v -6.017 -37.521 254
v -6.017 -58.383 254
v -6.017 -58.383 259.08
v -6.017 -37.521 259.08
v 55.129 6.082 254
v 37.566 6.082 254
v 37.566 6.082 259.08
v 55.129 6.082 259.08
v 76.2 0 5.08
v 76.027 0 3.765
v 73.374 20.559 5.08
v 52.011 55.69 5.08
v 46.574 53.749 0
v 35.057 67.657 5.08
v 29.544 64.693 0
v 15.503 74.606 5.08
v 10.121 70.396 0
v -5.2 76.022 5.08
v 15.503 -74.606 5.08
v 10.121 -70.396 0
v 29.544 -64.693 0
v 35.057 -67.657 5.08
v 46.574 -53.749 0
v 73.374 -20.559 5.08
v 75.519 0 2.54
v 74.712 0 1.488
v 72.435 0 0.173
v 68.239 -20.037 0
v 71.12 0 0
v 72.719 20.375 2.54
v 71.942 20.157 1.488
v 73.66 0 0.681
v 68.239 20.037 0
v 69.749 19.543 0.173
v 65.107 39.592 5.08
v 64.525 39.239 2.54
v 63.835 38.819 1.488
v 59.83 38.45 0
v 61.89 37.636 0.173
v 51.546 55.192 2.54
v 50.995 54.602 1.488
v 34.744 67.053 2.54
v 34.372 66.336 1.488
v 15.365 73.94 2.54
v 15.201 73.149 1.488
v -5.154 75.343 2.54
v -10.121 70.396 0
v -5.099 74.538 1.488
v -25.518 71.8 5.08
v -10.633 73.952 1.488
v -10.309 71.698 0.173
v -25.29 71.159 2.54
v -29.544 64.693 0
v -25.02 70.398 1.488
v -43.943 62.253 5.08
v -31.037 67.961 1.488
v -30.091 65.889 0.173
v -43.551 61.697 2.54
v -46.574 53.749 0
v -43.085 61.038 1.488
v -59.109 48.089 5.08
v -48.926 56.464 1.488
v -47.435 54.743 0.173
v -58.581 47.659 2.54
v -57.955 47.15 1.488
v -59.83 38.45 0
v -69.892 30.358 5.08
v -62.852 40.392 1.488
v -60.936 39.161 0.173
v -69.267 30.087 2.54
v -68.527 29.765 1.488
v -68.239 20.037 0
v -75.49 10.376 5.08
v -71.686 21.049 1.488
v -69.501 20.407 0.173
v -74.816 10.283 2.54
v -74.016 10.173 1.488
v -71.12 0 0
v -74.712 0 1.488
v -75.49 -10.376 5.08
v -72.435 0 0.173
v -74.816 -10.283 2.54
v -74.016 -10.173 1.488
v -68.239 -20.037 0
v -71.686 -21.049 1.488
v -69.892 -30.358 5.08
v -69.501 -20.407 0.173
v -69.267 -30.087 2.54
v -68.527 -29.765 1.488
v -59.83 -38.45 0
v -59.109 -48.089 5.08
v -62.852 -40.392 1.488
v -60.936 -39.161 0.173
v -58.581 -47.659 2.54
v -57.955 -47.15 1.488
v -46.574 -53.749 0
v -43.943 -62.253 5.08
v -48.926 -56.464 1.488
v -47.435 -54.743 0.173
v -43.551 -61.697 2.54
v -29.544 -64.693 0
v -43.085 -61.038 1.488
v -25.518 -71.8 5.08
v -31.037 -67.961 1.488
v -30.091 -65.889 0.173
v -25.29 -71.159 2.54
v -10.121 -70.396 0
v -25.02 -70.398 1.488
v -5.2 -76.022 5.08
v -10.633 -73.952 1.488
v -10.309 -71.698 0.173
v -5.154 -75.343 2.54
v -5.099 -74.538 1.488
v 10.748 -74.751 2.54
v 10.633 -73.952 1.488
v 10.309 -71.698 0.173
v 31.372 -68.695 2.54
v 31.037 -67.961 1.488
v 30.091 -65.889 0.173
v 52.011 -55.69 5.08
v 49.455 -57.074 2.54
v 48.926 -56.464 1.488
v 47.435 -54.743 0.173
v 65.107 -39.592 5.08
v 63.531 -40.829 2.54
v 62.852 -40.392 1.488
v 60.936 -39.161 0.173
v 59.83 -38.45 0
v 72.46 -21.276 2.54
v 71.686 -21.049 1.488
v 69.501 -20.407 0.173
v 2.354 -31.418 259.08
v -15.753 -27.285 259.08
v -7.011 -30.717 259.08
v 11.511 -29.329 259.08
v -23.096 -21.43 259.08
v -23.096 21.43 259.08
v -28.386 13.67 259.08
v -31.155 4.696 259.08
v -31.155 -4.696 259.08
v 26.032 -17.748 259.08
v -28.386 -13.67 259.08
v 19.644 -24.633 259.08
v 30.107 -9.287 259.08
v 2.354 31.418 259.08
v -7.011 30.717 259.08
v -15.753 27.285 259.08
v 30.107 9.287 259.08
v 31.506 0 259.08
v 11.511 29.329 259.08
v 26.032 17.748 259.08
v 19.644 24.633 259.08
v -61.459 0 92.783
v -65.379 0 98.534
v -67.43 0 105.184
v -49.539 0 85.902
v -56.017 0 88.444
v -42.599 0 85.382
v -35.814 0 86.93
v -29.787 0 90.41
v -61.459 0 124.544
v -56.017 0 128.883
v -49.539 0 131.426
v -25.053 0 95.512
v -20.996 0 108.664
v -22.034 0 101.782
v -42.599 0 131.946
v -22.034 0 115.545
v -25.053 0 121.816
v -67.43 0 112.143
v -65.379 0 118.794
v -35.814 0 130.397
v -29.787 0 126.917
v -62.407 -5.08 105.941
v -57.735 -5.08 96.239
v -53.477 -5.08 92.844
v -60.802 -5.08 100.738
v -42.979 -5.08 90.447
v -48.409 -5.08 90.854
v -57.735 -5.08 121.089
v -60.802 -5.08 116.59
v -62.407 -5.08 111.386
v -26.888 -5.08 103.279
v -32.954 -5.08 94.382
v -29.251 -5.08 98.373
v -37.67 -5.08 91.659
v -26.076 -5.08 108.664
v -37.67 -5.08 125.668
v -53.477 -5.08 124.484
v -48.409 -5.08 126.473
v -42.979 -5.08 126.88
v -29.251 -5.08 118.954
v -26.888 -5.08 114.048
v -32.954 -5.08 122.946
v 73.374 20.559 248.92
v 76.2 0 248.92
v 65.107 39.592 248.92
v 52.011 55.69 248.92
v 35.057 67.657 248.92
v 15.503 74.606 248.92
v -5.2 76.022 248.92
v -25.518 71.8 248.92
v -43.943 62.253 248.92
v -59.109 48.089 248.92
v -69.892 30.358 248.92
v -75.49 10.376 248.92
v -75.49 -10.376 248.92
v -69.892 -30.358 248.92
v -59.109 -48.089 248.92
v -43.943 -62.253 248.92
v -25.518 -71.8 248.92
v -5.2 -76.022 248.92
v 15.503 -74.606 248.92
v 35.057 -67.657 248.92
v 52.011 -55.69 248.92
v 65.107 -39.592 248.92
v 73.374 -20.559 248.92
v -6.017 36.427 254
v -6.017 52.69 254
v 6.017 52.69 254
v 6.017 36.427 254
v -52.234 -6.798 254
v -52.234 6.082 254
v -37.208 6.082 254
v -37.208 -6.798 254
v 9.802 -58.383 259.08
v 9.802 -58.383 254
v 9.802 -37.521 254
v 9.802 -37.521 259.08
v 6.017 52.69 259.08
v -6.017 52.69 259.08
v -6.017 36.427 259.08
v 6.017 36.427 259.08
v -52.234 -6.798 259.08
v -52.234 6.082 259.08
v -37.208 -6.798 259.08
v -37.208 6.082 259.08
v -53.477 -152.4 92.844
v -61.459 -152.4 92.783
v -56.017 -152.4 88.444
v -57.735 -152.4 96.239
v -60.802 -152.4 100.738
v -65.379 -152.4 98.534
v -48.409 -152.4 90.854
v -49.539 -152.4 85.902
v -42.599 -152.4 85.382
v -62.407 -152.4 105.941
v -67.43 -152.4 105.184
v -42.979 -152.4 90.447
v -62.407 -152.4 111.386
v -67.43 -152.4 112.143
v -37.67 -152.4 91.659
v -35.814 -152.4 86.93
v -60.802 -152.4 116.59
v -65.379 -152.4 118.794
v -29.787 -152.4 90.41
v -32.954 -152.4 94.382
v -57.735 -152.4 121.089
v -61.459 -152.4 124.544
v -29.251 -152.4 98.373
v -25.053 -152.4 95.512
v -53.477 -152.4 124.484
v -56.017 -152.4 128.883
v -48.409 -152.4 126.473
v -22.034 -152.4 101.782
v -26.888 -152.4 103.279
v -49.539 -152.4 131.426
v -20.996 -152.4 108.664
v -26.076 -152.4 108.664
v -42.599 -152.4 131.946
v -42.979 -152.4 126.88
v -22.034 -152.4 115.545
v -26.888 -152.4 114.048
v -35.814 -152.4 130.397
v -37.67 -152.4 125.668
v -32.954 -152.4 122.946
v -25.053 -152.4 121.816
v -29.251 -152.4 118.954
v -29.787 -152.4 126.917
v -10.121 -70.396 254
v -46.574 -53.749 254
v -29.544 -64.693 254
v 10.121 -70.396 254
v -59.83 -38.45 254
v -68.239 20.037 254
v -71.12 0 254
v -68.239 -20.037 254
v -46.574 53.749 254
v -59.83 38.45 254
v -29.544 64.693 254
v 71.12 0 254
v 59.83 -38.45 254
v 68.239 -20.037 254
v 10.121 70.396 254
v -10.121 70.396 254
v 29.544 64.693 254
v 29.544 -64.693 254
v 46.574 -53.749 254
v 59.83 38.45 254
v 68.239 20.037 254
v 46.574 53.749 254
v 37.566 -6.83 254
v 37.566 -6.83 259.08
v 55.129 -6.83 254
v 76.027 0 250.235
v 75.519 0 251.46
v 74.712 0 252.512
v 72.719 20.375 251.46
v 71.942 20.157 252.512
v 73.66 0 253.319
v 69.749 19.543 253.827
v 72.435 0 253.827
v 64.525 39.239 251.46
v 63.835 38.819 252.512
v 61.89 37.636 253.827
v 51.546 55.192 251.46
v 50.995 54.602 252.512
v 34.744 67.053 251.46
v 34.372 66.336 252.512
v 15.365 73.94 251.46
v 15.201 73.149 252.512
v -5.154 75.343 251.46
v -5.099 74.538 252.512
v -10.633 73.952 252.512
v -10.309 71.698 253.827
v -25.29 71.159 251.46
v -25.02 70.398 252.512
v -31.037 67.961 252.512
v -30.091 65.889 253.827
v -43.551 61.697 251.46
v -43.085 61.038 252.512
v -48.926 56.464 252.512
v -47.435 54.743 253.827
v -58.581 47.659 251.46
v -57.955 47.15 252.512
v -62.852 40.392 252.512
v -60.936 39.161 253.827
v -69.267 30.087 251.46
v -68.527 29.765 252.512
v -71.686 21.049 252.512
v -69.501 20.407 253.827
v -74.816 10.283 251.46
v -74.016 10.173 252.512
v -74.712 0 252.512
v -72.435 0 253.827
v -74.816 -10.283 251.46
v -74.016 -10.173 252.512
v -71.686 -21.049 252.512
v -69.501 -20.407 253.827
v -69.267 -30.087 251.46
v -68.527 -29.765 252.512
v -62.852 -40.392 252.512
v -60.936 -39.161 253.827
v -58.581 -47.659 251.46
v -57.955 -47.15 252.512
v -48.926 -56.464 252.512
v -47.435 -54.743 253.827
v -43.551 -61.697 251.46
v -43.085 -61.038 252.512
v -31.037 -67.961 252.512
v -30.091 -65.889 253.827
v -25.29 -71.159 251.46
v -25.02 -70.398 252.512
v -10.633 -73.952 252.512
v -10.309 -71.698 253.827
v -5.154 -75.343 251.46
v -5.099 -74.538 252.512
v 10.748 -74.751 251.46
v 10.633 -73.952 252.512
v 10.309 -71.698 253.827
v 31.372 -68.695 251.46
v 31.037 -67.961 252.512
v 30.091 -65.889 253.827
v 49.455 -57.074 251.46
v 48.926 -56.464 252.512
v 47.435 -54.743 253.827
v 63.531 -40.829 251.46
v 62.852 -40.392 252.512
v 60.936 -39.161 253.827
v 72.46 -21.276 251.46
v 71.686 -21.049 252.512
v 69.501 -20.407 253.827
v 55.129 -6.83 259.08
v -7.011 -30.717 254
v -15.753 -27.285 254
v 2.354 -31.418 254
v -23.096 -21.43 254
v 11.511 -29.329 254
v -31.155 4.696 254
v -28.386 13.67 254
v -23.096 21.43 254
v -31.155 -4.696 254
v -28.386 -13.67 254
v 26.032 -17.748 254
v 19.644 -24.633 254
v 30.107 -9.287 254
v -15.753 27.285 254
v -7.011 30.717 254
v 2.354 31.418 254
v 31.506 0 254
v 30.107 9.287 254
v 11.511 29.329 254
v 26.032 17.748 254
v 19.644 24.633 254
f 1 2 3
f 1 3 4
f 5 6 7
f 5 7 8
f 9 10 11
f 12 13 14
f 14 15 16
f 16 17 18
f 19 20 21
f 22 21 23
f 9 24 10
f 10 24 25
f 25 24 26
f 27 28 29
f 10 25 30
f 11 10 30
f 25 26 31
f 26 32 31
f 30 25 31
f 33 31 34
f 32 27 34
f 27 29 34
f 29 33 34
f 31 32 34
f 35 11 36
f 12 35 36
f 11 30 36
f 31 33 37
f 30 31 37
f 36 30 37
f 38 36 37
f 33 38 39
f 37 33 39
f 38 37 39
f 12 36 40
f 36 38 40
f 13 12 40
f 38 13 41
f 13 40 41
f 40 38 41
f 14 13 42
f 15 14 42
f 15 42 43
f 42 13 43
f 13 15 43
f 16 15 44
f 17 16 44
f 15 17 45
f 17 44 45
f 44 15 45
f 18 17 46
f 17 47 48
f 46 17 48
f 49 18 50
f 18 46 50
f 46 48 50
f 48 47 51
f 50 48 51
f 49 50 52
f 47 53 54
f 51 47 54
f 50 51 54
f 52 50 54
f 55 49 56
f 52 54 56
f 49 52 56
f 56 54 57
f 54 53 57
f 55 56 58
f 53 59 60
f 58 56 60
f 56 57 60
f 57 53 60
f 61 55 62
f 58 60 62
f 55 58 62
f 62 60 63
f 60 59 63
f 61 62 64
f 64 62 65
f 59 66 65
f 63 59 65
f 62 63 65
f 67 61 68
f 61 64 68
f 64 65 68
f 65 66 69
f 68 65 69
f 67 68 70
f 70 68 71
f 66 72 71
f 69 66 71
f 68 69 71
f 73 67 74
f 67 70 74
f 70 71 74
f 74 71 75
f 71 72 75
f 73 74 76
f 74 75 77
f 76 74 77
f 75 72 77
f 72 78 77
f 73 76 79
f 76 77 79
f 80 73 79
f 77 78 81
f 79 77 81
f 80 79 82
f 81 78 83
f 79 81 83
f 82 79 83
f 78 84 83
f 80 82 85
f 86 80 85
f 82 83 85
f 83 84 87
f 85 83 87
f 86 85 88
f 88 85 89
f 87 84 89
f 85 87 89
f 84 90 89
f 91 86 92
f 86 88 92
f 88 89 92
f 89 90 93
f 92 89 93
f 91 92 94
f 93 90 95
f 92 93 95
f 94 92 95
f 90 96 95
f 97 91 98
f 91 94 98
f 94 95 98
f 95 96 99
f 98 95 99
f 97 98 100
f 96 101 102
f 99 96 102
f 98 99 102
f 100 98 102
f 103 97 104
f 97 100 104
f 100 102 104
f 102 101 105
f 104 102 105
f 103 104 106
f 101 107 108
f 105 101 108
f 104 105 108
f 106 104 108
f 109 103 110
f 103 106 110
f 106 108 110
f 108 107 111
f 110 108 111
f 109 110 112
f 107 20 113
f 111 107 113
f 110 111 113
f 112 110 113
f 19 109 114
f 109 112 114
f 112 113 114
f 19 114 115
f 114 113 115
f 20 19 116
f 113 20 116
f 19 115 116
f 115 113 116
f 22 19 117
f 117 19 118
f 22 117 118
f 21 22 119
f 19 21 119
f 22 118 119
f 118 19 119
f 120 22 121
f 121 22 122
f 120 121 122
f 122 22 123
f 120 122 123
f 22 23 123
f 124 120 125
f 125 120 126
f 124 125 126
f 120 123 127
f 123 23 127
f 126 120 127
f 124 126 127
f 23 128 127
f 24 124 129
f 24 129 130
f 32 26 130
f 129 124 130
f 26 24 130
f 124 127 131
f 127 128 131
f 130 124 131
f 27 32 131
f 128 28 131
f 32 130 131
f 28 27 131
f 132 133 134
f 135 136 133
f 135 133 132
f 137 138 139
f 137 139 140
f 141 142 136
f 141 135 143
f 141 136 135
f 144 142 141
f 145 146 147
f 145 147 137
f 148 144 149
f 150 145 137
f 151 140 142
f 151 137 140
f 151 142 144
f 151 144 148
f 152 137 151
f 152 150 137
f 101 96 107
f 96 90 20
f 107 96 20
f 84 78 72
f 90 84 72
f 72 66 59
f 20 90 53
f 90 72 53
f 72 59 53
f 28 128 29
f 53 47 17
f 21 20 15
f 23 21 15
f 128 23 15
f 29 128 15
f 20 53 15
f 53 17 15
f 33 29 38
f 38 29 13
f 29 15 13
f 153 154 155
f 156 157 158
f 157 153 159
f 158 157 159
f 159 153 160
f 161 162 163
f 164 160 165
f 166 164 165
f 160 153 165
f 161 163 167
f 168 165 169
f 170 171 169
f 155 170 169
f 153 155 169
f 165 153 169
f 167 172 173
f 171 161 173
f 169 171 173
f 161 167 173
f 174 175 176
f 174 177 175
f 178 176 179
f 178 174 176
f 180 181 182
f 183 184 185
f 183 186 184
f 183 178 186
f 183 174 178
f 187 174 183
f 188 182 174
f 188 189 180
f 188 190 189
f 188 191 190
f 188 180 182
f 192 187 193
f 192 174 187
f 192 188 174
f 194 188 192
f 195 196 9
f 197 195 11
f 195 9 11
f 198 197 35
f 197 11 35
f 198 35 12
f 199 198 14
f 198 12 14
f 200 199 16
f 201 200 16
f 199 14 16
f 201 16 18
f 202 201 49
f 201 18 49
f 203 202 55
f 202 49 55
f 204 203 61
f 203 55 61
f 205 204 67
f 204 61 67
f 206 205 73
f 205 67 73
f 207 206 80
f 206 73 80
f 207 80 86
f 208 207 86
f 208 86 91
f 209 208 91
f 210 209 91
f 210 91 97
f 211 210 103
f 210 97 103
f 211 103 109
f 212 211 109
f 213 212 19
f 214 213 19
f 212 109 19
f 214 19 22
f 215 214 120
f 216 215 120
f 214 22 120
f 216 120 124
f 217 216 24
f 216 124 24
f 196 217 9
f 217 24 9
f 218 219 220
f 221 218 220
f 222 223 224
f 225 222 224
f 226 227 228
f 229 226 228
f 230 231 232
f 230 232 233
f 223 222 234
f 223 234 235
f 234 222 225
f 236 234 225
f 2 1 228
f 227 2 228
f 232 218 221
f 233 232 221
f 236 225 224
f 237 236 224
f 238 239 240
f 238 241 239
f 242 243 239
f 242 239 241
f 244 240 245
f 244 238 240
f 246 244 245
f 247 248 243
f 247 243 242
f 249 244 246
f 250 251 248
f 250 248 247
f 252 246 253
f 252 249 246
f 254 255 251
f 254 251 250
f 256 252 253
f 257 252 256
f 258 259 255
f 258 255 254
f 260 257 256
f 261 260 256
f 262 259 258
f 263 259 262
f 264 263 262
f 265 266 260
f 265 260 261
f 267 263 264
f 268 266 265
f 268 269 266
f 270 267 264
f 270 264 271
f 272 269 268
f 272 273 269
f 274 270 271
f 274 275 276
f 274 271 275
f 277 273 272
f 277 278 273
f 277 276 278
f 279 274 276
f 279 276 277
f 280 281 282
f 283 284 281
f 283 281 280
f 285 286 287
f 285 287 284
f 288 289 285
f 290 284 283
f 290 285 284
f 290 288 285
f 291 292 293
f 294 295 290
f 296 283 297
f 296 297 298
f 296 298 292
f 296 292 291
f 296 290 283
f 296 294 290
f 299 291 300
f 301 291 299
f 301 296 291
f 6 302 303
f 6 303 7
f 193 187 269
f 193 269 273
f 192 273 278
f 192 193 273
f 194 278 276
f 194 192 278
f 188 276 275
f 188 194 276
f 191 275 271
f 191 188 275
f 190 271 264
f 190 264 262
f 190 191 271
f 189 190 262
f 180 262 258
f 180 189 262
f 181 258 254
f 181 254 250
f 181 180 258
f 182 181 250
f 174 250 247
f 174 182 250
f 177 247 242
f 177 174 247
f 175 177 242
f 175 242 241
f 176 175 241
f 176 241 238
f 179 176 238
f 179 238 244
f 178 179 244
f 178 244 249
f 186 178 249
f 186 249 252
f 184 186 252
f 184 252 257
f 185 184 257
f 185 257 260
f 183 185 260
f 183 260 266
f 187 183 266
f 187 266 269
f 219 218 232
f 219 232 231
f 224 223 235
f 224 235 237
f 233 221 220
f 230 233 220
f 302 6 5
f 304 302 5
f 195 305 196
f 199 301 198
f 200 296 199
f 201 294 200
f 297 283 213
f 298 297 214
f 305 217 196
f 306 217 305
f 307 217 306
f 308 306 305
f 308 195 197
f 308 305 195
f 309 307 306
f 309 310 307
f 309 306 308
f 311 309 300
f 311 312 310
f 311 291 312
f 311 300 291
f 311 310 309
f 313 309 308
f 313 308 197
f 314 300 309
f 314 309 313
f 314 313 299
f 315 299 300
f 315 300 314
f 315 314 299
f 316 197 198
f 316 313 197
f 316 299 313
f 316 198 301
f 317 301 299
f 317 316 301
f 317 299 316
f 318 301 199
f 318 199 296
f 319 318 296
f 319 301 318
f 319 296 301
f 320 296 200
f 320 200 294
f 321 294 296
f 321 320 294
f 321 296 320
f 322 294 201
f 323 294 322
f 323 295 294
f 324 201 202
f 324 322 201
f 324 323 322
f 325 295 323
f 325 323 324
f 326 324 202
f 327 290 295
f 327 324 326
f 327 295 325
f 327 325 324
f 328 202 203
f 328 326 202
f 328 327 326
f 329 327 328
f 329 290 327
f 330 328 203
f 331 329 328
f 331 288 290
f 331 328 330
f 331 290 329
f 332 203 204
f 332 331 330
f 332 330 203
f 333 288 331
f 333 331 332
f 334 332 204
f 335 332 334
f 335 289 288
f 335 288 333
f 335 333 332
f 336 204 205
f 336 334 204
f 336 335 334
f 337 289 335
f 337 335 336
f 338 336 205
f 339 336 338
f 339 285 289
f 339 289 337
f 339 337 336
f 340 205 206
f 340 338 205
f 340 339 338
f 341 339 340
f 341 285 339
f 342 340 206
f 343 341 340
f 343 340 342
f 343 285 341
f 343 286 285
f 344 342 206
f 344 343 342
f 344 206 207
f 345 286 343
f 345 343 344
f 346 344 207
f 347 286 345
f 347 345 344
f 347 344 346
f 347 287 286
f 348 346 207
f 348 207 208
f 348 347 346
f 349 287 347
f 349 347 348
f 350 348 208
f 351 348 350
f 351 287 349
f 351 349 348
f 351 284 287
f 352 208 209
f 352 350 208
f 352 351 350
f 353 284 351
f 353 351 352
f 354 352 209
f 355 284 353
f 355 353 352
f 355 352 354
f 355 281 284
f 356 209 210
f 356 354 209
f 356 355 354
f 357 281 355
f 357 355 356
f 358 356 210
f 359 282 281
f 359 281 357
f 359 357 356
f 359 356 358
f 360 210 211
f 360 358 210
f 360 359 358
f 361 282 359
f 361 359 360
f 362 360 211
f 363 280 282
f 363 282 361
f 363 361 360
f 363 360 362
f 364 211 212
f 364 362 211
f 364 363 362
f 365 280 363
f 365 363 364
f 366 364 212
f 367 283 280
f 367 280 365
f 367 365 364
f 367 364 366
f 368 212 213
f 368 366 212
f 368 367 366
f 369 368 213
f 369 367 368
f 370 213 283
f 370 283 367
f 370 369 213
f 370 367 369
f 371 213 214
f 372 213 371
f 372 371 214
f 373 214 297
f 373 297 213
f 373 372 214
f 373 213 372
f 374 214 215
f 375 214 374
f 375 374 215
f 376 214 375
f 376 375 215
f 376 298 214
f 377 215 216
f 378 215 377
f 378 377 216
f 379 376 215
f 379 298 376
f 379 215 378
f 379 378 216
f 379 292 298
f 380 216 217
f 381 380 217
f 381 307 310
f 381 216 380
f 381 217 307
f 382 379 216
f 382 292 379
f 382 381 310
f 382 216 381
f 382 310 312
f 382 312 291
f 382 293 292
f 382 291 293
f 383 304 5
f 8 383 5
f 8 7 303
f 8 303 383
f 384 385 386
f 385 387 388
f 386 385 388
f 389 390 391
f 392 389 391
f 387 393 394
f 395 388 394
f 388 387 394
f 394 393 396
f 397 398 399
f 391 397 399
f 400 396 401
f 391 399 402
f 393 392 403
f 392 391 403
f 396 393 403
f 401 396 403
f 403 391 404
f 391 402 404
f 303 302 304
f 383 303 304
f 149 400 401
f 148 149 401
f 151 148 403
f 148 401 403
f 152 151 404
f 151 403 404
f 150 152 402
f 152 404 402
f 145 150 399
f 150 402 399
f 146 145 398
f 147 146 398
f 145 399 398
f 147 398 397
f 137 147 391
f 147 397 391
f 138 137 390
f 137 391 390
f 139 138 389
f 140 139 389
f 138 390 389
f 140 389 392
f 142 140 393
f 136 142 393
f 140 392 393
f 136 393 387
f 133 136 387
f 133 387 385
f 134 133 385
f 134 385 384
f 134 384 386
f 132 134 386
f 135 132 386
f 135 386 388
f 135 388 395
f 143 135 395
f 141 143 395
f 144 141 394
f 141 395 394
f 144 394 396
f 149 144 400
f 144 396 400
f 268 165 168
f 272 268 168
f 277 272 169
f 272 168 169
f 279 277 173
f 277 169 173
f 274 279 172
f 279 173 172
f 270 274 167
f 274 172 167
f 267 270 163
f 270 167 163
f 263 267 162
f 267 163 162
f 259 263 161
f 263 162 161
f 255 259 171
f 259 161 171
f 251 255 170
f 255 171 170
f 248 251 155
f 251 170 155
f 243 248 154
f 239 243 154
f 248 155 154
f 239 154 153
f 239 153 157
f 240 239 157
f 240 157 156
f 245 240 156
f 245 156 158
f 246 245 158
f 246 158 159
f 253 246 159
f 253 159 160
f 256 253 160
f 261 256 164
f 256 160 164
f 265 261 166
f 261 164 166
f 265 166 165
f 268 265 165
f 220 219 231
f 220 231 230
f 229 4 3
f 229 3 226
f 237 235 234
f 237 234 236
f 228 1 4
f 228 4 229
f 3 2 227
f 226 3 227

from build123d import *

# Parameters (mm, degrees)
F0_R      = 76.2
F1_DEPTH  = 254
F2_R      = 31.5064742485
F3_DEPTH  = 5.08
F5_R      = 5.08
F6_R      = 5.08
F7_W      = 15.0262638927
F7_H      = 12.87966175
F8_DEPTH  = 5.08
F9_W      = 12.0340203866
F9_H      = 16.2621960044
F10_DEPTH = 5.08
F11_W     = 17.5631716847
F11_H     = 12.9121849313
F12_DEPTH = 5.08
F13_W     = 15.818908345
F13_H     = 20.8626762033
F14_DEPTH = 5.08
F15_R     = 23.3473489608
F16_DEPTH = 152.4
F18_T     = -5.08


# Not quite as in the source:
# - a feature of the source that left no trace in its solid (it failed there, or was rolled back) is left out


with BuildPart() as f1:
    # F0 (on Top) → F1 (new body)
    with BuildSketch(Plane.XY):
        Circle(F0_R)
    extrude(amount=F1_DEPTH)

    # F5
    f5_edges = [f1.edges().sort_by_distance(p)[0] for p in [
        (-76.2, 0, 254),
    ]]
    fillet(f5_edges, radius=F5_R)

    # F6
    f6_edges = [f1.edges().sort_by_distance(p)[0] for p in [
        (-76.2, 0, 0),
    ]]
    fillet(f6_edges, radius=F6_R)


with BuildPart() as f3:
    # F2 (on face) → F3 (new body)
    with BuildSketch(Plane.XY.offset(254)):
        Circle(F2_R)
    extrude(amount=F3_DEPTH)


with BuildPart() as f8:
    # F7 (on face) → F8 (new body)
    with BuildSketch(Plane.XY.offset(254)):
        with Locations((-44.7210334241, -0.3577677999)):
            Rectangle(F7_W, F7_H)
    extrude(amount=F8_DEPTH)


with BuildPart() as f10:
    # F9 (on face) → F10 (new body)
    with BuildSketch(Plane.XY.offset(254)):
        with Locations((0, 44.558417052)):
            Rectangle(F9_W, F9_H)
    extrude(amount=F10_DEPTH)


with BuildPart() as f12:
    # F11 (on face) → F12 (new body)
    with BuildSketch(Plane.XY.offset(254)):
        with Locations((46.3472604752, -0.3740293905)):
            Rectangle(F11_W, F11_H)
    extrude(amount=F12_DEPTH)


with BuildPart() as f14:
    # F13 (on face) → F14 (new body)
    with BuildSketch(Plane.XY.offset(254)):
        with Locations((1.8924439792, -47.9520522058)):
            Rectangle(F13_W, F13_H)
    extrude(amount=F14_DEPTH)


with BuildPart() as f16:
    # F15 (on Front) → F16 (new body)
    with BuildSketch(Plane.XZ):
        with Locations((-44.3437509239, -31.4783900976)):
            Circle(F15_R)
    extrude(amount=F16_DEPTH)


with BuildPart() as f16_1:
    # F17: moved
    add(f16.part.moved(Location((0, 0, 140.14199))))

    # F18
    f18_openings = [f16_1.faces().sort_by_distance(p)[0] for p in [
        (-44.343751, -152.4, 108.6636),
    ]]
    offset(amount=F18_T, openings=f18_openings)


solid = Compound([f1.part, f3.part, f8.part, f10.part, f12.part, f14.part, f16_1.part])
